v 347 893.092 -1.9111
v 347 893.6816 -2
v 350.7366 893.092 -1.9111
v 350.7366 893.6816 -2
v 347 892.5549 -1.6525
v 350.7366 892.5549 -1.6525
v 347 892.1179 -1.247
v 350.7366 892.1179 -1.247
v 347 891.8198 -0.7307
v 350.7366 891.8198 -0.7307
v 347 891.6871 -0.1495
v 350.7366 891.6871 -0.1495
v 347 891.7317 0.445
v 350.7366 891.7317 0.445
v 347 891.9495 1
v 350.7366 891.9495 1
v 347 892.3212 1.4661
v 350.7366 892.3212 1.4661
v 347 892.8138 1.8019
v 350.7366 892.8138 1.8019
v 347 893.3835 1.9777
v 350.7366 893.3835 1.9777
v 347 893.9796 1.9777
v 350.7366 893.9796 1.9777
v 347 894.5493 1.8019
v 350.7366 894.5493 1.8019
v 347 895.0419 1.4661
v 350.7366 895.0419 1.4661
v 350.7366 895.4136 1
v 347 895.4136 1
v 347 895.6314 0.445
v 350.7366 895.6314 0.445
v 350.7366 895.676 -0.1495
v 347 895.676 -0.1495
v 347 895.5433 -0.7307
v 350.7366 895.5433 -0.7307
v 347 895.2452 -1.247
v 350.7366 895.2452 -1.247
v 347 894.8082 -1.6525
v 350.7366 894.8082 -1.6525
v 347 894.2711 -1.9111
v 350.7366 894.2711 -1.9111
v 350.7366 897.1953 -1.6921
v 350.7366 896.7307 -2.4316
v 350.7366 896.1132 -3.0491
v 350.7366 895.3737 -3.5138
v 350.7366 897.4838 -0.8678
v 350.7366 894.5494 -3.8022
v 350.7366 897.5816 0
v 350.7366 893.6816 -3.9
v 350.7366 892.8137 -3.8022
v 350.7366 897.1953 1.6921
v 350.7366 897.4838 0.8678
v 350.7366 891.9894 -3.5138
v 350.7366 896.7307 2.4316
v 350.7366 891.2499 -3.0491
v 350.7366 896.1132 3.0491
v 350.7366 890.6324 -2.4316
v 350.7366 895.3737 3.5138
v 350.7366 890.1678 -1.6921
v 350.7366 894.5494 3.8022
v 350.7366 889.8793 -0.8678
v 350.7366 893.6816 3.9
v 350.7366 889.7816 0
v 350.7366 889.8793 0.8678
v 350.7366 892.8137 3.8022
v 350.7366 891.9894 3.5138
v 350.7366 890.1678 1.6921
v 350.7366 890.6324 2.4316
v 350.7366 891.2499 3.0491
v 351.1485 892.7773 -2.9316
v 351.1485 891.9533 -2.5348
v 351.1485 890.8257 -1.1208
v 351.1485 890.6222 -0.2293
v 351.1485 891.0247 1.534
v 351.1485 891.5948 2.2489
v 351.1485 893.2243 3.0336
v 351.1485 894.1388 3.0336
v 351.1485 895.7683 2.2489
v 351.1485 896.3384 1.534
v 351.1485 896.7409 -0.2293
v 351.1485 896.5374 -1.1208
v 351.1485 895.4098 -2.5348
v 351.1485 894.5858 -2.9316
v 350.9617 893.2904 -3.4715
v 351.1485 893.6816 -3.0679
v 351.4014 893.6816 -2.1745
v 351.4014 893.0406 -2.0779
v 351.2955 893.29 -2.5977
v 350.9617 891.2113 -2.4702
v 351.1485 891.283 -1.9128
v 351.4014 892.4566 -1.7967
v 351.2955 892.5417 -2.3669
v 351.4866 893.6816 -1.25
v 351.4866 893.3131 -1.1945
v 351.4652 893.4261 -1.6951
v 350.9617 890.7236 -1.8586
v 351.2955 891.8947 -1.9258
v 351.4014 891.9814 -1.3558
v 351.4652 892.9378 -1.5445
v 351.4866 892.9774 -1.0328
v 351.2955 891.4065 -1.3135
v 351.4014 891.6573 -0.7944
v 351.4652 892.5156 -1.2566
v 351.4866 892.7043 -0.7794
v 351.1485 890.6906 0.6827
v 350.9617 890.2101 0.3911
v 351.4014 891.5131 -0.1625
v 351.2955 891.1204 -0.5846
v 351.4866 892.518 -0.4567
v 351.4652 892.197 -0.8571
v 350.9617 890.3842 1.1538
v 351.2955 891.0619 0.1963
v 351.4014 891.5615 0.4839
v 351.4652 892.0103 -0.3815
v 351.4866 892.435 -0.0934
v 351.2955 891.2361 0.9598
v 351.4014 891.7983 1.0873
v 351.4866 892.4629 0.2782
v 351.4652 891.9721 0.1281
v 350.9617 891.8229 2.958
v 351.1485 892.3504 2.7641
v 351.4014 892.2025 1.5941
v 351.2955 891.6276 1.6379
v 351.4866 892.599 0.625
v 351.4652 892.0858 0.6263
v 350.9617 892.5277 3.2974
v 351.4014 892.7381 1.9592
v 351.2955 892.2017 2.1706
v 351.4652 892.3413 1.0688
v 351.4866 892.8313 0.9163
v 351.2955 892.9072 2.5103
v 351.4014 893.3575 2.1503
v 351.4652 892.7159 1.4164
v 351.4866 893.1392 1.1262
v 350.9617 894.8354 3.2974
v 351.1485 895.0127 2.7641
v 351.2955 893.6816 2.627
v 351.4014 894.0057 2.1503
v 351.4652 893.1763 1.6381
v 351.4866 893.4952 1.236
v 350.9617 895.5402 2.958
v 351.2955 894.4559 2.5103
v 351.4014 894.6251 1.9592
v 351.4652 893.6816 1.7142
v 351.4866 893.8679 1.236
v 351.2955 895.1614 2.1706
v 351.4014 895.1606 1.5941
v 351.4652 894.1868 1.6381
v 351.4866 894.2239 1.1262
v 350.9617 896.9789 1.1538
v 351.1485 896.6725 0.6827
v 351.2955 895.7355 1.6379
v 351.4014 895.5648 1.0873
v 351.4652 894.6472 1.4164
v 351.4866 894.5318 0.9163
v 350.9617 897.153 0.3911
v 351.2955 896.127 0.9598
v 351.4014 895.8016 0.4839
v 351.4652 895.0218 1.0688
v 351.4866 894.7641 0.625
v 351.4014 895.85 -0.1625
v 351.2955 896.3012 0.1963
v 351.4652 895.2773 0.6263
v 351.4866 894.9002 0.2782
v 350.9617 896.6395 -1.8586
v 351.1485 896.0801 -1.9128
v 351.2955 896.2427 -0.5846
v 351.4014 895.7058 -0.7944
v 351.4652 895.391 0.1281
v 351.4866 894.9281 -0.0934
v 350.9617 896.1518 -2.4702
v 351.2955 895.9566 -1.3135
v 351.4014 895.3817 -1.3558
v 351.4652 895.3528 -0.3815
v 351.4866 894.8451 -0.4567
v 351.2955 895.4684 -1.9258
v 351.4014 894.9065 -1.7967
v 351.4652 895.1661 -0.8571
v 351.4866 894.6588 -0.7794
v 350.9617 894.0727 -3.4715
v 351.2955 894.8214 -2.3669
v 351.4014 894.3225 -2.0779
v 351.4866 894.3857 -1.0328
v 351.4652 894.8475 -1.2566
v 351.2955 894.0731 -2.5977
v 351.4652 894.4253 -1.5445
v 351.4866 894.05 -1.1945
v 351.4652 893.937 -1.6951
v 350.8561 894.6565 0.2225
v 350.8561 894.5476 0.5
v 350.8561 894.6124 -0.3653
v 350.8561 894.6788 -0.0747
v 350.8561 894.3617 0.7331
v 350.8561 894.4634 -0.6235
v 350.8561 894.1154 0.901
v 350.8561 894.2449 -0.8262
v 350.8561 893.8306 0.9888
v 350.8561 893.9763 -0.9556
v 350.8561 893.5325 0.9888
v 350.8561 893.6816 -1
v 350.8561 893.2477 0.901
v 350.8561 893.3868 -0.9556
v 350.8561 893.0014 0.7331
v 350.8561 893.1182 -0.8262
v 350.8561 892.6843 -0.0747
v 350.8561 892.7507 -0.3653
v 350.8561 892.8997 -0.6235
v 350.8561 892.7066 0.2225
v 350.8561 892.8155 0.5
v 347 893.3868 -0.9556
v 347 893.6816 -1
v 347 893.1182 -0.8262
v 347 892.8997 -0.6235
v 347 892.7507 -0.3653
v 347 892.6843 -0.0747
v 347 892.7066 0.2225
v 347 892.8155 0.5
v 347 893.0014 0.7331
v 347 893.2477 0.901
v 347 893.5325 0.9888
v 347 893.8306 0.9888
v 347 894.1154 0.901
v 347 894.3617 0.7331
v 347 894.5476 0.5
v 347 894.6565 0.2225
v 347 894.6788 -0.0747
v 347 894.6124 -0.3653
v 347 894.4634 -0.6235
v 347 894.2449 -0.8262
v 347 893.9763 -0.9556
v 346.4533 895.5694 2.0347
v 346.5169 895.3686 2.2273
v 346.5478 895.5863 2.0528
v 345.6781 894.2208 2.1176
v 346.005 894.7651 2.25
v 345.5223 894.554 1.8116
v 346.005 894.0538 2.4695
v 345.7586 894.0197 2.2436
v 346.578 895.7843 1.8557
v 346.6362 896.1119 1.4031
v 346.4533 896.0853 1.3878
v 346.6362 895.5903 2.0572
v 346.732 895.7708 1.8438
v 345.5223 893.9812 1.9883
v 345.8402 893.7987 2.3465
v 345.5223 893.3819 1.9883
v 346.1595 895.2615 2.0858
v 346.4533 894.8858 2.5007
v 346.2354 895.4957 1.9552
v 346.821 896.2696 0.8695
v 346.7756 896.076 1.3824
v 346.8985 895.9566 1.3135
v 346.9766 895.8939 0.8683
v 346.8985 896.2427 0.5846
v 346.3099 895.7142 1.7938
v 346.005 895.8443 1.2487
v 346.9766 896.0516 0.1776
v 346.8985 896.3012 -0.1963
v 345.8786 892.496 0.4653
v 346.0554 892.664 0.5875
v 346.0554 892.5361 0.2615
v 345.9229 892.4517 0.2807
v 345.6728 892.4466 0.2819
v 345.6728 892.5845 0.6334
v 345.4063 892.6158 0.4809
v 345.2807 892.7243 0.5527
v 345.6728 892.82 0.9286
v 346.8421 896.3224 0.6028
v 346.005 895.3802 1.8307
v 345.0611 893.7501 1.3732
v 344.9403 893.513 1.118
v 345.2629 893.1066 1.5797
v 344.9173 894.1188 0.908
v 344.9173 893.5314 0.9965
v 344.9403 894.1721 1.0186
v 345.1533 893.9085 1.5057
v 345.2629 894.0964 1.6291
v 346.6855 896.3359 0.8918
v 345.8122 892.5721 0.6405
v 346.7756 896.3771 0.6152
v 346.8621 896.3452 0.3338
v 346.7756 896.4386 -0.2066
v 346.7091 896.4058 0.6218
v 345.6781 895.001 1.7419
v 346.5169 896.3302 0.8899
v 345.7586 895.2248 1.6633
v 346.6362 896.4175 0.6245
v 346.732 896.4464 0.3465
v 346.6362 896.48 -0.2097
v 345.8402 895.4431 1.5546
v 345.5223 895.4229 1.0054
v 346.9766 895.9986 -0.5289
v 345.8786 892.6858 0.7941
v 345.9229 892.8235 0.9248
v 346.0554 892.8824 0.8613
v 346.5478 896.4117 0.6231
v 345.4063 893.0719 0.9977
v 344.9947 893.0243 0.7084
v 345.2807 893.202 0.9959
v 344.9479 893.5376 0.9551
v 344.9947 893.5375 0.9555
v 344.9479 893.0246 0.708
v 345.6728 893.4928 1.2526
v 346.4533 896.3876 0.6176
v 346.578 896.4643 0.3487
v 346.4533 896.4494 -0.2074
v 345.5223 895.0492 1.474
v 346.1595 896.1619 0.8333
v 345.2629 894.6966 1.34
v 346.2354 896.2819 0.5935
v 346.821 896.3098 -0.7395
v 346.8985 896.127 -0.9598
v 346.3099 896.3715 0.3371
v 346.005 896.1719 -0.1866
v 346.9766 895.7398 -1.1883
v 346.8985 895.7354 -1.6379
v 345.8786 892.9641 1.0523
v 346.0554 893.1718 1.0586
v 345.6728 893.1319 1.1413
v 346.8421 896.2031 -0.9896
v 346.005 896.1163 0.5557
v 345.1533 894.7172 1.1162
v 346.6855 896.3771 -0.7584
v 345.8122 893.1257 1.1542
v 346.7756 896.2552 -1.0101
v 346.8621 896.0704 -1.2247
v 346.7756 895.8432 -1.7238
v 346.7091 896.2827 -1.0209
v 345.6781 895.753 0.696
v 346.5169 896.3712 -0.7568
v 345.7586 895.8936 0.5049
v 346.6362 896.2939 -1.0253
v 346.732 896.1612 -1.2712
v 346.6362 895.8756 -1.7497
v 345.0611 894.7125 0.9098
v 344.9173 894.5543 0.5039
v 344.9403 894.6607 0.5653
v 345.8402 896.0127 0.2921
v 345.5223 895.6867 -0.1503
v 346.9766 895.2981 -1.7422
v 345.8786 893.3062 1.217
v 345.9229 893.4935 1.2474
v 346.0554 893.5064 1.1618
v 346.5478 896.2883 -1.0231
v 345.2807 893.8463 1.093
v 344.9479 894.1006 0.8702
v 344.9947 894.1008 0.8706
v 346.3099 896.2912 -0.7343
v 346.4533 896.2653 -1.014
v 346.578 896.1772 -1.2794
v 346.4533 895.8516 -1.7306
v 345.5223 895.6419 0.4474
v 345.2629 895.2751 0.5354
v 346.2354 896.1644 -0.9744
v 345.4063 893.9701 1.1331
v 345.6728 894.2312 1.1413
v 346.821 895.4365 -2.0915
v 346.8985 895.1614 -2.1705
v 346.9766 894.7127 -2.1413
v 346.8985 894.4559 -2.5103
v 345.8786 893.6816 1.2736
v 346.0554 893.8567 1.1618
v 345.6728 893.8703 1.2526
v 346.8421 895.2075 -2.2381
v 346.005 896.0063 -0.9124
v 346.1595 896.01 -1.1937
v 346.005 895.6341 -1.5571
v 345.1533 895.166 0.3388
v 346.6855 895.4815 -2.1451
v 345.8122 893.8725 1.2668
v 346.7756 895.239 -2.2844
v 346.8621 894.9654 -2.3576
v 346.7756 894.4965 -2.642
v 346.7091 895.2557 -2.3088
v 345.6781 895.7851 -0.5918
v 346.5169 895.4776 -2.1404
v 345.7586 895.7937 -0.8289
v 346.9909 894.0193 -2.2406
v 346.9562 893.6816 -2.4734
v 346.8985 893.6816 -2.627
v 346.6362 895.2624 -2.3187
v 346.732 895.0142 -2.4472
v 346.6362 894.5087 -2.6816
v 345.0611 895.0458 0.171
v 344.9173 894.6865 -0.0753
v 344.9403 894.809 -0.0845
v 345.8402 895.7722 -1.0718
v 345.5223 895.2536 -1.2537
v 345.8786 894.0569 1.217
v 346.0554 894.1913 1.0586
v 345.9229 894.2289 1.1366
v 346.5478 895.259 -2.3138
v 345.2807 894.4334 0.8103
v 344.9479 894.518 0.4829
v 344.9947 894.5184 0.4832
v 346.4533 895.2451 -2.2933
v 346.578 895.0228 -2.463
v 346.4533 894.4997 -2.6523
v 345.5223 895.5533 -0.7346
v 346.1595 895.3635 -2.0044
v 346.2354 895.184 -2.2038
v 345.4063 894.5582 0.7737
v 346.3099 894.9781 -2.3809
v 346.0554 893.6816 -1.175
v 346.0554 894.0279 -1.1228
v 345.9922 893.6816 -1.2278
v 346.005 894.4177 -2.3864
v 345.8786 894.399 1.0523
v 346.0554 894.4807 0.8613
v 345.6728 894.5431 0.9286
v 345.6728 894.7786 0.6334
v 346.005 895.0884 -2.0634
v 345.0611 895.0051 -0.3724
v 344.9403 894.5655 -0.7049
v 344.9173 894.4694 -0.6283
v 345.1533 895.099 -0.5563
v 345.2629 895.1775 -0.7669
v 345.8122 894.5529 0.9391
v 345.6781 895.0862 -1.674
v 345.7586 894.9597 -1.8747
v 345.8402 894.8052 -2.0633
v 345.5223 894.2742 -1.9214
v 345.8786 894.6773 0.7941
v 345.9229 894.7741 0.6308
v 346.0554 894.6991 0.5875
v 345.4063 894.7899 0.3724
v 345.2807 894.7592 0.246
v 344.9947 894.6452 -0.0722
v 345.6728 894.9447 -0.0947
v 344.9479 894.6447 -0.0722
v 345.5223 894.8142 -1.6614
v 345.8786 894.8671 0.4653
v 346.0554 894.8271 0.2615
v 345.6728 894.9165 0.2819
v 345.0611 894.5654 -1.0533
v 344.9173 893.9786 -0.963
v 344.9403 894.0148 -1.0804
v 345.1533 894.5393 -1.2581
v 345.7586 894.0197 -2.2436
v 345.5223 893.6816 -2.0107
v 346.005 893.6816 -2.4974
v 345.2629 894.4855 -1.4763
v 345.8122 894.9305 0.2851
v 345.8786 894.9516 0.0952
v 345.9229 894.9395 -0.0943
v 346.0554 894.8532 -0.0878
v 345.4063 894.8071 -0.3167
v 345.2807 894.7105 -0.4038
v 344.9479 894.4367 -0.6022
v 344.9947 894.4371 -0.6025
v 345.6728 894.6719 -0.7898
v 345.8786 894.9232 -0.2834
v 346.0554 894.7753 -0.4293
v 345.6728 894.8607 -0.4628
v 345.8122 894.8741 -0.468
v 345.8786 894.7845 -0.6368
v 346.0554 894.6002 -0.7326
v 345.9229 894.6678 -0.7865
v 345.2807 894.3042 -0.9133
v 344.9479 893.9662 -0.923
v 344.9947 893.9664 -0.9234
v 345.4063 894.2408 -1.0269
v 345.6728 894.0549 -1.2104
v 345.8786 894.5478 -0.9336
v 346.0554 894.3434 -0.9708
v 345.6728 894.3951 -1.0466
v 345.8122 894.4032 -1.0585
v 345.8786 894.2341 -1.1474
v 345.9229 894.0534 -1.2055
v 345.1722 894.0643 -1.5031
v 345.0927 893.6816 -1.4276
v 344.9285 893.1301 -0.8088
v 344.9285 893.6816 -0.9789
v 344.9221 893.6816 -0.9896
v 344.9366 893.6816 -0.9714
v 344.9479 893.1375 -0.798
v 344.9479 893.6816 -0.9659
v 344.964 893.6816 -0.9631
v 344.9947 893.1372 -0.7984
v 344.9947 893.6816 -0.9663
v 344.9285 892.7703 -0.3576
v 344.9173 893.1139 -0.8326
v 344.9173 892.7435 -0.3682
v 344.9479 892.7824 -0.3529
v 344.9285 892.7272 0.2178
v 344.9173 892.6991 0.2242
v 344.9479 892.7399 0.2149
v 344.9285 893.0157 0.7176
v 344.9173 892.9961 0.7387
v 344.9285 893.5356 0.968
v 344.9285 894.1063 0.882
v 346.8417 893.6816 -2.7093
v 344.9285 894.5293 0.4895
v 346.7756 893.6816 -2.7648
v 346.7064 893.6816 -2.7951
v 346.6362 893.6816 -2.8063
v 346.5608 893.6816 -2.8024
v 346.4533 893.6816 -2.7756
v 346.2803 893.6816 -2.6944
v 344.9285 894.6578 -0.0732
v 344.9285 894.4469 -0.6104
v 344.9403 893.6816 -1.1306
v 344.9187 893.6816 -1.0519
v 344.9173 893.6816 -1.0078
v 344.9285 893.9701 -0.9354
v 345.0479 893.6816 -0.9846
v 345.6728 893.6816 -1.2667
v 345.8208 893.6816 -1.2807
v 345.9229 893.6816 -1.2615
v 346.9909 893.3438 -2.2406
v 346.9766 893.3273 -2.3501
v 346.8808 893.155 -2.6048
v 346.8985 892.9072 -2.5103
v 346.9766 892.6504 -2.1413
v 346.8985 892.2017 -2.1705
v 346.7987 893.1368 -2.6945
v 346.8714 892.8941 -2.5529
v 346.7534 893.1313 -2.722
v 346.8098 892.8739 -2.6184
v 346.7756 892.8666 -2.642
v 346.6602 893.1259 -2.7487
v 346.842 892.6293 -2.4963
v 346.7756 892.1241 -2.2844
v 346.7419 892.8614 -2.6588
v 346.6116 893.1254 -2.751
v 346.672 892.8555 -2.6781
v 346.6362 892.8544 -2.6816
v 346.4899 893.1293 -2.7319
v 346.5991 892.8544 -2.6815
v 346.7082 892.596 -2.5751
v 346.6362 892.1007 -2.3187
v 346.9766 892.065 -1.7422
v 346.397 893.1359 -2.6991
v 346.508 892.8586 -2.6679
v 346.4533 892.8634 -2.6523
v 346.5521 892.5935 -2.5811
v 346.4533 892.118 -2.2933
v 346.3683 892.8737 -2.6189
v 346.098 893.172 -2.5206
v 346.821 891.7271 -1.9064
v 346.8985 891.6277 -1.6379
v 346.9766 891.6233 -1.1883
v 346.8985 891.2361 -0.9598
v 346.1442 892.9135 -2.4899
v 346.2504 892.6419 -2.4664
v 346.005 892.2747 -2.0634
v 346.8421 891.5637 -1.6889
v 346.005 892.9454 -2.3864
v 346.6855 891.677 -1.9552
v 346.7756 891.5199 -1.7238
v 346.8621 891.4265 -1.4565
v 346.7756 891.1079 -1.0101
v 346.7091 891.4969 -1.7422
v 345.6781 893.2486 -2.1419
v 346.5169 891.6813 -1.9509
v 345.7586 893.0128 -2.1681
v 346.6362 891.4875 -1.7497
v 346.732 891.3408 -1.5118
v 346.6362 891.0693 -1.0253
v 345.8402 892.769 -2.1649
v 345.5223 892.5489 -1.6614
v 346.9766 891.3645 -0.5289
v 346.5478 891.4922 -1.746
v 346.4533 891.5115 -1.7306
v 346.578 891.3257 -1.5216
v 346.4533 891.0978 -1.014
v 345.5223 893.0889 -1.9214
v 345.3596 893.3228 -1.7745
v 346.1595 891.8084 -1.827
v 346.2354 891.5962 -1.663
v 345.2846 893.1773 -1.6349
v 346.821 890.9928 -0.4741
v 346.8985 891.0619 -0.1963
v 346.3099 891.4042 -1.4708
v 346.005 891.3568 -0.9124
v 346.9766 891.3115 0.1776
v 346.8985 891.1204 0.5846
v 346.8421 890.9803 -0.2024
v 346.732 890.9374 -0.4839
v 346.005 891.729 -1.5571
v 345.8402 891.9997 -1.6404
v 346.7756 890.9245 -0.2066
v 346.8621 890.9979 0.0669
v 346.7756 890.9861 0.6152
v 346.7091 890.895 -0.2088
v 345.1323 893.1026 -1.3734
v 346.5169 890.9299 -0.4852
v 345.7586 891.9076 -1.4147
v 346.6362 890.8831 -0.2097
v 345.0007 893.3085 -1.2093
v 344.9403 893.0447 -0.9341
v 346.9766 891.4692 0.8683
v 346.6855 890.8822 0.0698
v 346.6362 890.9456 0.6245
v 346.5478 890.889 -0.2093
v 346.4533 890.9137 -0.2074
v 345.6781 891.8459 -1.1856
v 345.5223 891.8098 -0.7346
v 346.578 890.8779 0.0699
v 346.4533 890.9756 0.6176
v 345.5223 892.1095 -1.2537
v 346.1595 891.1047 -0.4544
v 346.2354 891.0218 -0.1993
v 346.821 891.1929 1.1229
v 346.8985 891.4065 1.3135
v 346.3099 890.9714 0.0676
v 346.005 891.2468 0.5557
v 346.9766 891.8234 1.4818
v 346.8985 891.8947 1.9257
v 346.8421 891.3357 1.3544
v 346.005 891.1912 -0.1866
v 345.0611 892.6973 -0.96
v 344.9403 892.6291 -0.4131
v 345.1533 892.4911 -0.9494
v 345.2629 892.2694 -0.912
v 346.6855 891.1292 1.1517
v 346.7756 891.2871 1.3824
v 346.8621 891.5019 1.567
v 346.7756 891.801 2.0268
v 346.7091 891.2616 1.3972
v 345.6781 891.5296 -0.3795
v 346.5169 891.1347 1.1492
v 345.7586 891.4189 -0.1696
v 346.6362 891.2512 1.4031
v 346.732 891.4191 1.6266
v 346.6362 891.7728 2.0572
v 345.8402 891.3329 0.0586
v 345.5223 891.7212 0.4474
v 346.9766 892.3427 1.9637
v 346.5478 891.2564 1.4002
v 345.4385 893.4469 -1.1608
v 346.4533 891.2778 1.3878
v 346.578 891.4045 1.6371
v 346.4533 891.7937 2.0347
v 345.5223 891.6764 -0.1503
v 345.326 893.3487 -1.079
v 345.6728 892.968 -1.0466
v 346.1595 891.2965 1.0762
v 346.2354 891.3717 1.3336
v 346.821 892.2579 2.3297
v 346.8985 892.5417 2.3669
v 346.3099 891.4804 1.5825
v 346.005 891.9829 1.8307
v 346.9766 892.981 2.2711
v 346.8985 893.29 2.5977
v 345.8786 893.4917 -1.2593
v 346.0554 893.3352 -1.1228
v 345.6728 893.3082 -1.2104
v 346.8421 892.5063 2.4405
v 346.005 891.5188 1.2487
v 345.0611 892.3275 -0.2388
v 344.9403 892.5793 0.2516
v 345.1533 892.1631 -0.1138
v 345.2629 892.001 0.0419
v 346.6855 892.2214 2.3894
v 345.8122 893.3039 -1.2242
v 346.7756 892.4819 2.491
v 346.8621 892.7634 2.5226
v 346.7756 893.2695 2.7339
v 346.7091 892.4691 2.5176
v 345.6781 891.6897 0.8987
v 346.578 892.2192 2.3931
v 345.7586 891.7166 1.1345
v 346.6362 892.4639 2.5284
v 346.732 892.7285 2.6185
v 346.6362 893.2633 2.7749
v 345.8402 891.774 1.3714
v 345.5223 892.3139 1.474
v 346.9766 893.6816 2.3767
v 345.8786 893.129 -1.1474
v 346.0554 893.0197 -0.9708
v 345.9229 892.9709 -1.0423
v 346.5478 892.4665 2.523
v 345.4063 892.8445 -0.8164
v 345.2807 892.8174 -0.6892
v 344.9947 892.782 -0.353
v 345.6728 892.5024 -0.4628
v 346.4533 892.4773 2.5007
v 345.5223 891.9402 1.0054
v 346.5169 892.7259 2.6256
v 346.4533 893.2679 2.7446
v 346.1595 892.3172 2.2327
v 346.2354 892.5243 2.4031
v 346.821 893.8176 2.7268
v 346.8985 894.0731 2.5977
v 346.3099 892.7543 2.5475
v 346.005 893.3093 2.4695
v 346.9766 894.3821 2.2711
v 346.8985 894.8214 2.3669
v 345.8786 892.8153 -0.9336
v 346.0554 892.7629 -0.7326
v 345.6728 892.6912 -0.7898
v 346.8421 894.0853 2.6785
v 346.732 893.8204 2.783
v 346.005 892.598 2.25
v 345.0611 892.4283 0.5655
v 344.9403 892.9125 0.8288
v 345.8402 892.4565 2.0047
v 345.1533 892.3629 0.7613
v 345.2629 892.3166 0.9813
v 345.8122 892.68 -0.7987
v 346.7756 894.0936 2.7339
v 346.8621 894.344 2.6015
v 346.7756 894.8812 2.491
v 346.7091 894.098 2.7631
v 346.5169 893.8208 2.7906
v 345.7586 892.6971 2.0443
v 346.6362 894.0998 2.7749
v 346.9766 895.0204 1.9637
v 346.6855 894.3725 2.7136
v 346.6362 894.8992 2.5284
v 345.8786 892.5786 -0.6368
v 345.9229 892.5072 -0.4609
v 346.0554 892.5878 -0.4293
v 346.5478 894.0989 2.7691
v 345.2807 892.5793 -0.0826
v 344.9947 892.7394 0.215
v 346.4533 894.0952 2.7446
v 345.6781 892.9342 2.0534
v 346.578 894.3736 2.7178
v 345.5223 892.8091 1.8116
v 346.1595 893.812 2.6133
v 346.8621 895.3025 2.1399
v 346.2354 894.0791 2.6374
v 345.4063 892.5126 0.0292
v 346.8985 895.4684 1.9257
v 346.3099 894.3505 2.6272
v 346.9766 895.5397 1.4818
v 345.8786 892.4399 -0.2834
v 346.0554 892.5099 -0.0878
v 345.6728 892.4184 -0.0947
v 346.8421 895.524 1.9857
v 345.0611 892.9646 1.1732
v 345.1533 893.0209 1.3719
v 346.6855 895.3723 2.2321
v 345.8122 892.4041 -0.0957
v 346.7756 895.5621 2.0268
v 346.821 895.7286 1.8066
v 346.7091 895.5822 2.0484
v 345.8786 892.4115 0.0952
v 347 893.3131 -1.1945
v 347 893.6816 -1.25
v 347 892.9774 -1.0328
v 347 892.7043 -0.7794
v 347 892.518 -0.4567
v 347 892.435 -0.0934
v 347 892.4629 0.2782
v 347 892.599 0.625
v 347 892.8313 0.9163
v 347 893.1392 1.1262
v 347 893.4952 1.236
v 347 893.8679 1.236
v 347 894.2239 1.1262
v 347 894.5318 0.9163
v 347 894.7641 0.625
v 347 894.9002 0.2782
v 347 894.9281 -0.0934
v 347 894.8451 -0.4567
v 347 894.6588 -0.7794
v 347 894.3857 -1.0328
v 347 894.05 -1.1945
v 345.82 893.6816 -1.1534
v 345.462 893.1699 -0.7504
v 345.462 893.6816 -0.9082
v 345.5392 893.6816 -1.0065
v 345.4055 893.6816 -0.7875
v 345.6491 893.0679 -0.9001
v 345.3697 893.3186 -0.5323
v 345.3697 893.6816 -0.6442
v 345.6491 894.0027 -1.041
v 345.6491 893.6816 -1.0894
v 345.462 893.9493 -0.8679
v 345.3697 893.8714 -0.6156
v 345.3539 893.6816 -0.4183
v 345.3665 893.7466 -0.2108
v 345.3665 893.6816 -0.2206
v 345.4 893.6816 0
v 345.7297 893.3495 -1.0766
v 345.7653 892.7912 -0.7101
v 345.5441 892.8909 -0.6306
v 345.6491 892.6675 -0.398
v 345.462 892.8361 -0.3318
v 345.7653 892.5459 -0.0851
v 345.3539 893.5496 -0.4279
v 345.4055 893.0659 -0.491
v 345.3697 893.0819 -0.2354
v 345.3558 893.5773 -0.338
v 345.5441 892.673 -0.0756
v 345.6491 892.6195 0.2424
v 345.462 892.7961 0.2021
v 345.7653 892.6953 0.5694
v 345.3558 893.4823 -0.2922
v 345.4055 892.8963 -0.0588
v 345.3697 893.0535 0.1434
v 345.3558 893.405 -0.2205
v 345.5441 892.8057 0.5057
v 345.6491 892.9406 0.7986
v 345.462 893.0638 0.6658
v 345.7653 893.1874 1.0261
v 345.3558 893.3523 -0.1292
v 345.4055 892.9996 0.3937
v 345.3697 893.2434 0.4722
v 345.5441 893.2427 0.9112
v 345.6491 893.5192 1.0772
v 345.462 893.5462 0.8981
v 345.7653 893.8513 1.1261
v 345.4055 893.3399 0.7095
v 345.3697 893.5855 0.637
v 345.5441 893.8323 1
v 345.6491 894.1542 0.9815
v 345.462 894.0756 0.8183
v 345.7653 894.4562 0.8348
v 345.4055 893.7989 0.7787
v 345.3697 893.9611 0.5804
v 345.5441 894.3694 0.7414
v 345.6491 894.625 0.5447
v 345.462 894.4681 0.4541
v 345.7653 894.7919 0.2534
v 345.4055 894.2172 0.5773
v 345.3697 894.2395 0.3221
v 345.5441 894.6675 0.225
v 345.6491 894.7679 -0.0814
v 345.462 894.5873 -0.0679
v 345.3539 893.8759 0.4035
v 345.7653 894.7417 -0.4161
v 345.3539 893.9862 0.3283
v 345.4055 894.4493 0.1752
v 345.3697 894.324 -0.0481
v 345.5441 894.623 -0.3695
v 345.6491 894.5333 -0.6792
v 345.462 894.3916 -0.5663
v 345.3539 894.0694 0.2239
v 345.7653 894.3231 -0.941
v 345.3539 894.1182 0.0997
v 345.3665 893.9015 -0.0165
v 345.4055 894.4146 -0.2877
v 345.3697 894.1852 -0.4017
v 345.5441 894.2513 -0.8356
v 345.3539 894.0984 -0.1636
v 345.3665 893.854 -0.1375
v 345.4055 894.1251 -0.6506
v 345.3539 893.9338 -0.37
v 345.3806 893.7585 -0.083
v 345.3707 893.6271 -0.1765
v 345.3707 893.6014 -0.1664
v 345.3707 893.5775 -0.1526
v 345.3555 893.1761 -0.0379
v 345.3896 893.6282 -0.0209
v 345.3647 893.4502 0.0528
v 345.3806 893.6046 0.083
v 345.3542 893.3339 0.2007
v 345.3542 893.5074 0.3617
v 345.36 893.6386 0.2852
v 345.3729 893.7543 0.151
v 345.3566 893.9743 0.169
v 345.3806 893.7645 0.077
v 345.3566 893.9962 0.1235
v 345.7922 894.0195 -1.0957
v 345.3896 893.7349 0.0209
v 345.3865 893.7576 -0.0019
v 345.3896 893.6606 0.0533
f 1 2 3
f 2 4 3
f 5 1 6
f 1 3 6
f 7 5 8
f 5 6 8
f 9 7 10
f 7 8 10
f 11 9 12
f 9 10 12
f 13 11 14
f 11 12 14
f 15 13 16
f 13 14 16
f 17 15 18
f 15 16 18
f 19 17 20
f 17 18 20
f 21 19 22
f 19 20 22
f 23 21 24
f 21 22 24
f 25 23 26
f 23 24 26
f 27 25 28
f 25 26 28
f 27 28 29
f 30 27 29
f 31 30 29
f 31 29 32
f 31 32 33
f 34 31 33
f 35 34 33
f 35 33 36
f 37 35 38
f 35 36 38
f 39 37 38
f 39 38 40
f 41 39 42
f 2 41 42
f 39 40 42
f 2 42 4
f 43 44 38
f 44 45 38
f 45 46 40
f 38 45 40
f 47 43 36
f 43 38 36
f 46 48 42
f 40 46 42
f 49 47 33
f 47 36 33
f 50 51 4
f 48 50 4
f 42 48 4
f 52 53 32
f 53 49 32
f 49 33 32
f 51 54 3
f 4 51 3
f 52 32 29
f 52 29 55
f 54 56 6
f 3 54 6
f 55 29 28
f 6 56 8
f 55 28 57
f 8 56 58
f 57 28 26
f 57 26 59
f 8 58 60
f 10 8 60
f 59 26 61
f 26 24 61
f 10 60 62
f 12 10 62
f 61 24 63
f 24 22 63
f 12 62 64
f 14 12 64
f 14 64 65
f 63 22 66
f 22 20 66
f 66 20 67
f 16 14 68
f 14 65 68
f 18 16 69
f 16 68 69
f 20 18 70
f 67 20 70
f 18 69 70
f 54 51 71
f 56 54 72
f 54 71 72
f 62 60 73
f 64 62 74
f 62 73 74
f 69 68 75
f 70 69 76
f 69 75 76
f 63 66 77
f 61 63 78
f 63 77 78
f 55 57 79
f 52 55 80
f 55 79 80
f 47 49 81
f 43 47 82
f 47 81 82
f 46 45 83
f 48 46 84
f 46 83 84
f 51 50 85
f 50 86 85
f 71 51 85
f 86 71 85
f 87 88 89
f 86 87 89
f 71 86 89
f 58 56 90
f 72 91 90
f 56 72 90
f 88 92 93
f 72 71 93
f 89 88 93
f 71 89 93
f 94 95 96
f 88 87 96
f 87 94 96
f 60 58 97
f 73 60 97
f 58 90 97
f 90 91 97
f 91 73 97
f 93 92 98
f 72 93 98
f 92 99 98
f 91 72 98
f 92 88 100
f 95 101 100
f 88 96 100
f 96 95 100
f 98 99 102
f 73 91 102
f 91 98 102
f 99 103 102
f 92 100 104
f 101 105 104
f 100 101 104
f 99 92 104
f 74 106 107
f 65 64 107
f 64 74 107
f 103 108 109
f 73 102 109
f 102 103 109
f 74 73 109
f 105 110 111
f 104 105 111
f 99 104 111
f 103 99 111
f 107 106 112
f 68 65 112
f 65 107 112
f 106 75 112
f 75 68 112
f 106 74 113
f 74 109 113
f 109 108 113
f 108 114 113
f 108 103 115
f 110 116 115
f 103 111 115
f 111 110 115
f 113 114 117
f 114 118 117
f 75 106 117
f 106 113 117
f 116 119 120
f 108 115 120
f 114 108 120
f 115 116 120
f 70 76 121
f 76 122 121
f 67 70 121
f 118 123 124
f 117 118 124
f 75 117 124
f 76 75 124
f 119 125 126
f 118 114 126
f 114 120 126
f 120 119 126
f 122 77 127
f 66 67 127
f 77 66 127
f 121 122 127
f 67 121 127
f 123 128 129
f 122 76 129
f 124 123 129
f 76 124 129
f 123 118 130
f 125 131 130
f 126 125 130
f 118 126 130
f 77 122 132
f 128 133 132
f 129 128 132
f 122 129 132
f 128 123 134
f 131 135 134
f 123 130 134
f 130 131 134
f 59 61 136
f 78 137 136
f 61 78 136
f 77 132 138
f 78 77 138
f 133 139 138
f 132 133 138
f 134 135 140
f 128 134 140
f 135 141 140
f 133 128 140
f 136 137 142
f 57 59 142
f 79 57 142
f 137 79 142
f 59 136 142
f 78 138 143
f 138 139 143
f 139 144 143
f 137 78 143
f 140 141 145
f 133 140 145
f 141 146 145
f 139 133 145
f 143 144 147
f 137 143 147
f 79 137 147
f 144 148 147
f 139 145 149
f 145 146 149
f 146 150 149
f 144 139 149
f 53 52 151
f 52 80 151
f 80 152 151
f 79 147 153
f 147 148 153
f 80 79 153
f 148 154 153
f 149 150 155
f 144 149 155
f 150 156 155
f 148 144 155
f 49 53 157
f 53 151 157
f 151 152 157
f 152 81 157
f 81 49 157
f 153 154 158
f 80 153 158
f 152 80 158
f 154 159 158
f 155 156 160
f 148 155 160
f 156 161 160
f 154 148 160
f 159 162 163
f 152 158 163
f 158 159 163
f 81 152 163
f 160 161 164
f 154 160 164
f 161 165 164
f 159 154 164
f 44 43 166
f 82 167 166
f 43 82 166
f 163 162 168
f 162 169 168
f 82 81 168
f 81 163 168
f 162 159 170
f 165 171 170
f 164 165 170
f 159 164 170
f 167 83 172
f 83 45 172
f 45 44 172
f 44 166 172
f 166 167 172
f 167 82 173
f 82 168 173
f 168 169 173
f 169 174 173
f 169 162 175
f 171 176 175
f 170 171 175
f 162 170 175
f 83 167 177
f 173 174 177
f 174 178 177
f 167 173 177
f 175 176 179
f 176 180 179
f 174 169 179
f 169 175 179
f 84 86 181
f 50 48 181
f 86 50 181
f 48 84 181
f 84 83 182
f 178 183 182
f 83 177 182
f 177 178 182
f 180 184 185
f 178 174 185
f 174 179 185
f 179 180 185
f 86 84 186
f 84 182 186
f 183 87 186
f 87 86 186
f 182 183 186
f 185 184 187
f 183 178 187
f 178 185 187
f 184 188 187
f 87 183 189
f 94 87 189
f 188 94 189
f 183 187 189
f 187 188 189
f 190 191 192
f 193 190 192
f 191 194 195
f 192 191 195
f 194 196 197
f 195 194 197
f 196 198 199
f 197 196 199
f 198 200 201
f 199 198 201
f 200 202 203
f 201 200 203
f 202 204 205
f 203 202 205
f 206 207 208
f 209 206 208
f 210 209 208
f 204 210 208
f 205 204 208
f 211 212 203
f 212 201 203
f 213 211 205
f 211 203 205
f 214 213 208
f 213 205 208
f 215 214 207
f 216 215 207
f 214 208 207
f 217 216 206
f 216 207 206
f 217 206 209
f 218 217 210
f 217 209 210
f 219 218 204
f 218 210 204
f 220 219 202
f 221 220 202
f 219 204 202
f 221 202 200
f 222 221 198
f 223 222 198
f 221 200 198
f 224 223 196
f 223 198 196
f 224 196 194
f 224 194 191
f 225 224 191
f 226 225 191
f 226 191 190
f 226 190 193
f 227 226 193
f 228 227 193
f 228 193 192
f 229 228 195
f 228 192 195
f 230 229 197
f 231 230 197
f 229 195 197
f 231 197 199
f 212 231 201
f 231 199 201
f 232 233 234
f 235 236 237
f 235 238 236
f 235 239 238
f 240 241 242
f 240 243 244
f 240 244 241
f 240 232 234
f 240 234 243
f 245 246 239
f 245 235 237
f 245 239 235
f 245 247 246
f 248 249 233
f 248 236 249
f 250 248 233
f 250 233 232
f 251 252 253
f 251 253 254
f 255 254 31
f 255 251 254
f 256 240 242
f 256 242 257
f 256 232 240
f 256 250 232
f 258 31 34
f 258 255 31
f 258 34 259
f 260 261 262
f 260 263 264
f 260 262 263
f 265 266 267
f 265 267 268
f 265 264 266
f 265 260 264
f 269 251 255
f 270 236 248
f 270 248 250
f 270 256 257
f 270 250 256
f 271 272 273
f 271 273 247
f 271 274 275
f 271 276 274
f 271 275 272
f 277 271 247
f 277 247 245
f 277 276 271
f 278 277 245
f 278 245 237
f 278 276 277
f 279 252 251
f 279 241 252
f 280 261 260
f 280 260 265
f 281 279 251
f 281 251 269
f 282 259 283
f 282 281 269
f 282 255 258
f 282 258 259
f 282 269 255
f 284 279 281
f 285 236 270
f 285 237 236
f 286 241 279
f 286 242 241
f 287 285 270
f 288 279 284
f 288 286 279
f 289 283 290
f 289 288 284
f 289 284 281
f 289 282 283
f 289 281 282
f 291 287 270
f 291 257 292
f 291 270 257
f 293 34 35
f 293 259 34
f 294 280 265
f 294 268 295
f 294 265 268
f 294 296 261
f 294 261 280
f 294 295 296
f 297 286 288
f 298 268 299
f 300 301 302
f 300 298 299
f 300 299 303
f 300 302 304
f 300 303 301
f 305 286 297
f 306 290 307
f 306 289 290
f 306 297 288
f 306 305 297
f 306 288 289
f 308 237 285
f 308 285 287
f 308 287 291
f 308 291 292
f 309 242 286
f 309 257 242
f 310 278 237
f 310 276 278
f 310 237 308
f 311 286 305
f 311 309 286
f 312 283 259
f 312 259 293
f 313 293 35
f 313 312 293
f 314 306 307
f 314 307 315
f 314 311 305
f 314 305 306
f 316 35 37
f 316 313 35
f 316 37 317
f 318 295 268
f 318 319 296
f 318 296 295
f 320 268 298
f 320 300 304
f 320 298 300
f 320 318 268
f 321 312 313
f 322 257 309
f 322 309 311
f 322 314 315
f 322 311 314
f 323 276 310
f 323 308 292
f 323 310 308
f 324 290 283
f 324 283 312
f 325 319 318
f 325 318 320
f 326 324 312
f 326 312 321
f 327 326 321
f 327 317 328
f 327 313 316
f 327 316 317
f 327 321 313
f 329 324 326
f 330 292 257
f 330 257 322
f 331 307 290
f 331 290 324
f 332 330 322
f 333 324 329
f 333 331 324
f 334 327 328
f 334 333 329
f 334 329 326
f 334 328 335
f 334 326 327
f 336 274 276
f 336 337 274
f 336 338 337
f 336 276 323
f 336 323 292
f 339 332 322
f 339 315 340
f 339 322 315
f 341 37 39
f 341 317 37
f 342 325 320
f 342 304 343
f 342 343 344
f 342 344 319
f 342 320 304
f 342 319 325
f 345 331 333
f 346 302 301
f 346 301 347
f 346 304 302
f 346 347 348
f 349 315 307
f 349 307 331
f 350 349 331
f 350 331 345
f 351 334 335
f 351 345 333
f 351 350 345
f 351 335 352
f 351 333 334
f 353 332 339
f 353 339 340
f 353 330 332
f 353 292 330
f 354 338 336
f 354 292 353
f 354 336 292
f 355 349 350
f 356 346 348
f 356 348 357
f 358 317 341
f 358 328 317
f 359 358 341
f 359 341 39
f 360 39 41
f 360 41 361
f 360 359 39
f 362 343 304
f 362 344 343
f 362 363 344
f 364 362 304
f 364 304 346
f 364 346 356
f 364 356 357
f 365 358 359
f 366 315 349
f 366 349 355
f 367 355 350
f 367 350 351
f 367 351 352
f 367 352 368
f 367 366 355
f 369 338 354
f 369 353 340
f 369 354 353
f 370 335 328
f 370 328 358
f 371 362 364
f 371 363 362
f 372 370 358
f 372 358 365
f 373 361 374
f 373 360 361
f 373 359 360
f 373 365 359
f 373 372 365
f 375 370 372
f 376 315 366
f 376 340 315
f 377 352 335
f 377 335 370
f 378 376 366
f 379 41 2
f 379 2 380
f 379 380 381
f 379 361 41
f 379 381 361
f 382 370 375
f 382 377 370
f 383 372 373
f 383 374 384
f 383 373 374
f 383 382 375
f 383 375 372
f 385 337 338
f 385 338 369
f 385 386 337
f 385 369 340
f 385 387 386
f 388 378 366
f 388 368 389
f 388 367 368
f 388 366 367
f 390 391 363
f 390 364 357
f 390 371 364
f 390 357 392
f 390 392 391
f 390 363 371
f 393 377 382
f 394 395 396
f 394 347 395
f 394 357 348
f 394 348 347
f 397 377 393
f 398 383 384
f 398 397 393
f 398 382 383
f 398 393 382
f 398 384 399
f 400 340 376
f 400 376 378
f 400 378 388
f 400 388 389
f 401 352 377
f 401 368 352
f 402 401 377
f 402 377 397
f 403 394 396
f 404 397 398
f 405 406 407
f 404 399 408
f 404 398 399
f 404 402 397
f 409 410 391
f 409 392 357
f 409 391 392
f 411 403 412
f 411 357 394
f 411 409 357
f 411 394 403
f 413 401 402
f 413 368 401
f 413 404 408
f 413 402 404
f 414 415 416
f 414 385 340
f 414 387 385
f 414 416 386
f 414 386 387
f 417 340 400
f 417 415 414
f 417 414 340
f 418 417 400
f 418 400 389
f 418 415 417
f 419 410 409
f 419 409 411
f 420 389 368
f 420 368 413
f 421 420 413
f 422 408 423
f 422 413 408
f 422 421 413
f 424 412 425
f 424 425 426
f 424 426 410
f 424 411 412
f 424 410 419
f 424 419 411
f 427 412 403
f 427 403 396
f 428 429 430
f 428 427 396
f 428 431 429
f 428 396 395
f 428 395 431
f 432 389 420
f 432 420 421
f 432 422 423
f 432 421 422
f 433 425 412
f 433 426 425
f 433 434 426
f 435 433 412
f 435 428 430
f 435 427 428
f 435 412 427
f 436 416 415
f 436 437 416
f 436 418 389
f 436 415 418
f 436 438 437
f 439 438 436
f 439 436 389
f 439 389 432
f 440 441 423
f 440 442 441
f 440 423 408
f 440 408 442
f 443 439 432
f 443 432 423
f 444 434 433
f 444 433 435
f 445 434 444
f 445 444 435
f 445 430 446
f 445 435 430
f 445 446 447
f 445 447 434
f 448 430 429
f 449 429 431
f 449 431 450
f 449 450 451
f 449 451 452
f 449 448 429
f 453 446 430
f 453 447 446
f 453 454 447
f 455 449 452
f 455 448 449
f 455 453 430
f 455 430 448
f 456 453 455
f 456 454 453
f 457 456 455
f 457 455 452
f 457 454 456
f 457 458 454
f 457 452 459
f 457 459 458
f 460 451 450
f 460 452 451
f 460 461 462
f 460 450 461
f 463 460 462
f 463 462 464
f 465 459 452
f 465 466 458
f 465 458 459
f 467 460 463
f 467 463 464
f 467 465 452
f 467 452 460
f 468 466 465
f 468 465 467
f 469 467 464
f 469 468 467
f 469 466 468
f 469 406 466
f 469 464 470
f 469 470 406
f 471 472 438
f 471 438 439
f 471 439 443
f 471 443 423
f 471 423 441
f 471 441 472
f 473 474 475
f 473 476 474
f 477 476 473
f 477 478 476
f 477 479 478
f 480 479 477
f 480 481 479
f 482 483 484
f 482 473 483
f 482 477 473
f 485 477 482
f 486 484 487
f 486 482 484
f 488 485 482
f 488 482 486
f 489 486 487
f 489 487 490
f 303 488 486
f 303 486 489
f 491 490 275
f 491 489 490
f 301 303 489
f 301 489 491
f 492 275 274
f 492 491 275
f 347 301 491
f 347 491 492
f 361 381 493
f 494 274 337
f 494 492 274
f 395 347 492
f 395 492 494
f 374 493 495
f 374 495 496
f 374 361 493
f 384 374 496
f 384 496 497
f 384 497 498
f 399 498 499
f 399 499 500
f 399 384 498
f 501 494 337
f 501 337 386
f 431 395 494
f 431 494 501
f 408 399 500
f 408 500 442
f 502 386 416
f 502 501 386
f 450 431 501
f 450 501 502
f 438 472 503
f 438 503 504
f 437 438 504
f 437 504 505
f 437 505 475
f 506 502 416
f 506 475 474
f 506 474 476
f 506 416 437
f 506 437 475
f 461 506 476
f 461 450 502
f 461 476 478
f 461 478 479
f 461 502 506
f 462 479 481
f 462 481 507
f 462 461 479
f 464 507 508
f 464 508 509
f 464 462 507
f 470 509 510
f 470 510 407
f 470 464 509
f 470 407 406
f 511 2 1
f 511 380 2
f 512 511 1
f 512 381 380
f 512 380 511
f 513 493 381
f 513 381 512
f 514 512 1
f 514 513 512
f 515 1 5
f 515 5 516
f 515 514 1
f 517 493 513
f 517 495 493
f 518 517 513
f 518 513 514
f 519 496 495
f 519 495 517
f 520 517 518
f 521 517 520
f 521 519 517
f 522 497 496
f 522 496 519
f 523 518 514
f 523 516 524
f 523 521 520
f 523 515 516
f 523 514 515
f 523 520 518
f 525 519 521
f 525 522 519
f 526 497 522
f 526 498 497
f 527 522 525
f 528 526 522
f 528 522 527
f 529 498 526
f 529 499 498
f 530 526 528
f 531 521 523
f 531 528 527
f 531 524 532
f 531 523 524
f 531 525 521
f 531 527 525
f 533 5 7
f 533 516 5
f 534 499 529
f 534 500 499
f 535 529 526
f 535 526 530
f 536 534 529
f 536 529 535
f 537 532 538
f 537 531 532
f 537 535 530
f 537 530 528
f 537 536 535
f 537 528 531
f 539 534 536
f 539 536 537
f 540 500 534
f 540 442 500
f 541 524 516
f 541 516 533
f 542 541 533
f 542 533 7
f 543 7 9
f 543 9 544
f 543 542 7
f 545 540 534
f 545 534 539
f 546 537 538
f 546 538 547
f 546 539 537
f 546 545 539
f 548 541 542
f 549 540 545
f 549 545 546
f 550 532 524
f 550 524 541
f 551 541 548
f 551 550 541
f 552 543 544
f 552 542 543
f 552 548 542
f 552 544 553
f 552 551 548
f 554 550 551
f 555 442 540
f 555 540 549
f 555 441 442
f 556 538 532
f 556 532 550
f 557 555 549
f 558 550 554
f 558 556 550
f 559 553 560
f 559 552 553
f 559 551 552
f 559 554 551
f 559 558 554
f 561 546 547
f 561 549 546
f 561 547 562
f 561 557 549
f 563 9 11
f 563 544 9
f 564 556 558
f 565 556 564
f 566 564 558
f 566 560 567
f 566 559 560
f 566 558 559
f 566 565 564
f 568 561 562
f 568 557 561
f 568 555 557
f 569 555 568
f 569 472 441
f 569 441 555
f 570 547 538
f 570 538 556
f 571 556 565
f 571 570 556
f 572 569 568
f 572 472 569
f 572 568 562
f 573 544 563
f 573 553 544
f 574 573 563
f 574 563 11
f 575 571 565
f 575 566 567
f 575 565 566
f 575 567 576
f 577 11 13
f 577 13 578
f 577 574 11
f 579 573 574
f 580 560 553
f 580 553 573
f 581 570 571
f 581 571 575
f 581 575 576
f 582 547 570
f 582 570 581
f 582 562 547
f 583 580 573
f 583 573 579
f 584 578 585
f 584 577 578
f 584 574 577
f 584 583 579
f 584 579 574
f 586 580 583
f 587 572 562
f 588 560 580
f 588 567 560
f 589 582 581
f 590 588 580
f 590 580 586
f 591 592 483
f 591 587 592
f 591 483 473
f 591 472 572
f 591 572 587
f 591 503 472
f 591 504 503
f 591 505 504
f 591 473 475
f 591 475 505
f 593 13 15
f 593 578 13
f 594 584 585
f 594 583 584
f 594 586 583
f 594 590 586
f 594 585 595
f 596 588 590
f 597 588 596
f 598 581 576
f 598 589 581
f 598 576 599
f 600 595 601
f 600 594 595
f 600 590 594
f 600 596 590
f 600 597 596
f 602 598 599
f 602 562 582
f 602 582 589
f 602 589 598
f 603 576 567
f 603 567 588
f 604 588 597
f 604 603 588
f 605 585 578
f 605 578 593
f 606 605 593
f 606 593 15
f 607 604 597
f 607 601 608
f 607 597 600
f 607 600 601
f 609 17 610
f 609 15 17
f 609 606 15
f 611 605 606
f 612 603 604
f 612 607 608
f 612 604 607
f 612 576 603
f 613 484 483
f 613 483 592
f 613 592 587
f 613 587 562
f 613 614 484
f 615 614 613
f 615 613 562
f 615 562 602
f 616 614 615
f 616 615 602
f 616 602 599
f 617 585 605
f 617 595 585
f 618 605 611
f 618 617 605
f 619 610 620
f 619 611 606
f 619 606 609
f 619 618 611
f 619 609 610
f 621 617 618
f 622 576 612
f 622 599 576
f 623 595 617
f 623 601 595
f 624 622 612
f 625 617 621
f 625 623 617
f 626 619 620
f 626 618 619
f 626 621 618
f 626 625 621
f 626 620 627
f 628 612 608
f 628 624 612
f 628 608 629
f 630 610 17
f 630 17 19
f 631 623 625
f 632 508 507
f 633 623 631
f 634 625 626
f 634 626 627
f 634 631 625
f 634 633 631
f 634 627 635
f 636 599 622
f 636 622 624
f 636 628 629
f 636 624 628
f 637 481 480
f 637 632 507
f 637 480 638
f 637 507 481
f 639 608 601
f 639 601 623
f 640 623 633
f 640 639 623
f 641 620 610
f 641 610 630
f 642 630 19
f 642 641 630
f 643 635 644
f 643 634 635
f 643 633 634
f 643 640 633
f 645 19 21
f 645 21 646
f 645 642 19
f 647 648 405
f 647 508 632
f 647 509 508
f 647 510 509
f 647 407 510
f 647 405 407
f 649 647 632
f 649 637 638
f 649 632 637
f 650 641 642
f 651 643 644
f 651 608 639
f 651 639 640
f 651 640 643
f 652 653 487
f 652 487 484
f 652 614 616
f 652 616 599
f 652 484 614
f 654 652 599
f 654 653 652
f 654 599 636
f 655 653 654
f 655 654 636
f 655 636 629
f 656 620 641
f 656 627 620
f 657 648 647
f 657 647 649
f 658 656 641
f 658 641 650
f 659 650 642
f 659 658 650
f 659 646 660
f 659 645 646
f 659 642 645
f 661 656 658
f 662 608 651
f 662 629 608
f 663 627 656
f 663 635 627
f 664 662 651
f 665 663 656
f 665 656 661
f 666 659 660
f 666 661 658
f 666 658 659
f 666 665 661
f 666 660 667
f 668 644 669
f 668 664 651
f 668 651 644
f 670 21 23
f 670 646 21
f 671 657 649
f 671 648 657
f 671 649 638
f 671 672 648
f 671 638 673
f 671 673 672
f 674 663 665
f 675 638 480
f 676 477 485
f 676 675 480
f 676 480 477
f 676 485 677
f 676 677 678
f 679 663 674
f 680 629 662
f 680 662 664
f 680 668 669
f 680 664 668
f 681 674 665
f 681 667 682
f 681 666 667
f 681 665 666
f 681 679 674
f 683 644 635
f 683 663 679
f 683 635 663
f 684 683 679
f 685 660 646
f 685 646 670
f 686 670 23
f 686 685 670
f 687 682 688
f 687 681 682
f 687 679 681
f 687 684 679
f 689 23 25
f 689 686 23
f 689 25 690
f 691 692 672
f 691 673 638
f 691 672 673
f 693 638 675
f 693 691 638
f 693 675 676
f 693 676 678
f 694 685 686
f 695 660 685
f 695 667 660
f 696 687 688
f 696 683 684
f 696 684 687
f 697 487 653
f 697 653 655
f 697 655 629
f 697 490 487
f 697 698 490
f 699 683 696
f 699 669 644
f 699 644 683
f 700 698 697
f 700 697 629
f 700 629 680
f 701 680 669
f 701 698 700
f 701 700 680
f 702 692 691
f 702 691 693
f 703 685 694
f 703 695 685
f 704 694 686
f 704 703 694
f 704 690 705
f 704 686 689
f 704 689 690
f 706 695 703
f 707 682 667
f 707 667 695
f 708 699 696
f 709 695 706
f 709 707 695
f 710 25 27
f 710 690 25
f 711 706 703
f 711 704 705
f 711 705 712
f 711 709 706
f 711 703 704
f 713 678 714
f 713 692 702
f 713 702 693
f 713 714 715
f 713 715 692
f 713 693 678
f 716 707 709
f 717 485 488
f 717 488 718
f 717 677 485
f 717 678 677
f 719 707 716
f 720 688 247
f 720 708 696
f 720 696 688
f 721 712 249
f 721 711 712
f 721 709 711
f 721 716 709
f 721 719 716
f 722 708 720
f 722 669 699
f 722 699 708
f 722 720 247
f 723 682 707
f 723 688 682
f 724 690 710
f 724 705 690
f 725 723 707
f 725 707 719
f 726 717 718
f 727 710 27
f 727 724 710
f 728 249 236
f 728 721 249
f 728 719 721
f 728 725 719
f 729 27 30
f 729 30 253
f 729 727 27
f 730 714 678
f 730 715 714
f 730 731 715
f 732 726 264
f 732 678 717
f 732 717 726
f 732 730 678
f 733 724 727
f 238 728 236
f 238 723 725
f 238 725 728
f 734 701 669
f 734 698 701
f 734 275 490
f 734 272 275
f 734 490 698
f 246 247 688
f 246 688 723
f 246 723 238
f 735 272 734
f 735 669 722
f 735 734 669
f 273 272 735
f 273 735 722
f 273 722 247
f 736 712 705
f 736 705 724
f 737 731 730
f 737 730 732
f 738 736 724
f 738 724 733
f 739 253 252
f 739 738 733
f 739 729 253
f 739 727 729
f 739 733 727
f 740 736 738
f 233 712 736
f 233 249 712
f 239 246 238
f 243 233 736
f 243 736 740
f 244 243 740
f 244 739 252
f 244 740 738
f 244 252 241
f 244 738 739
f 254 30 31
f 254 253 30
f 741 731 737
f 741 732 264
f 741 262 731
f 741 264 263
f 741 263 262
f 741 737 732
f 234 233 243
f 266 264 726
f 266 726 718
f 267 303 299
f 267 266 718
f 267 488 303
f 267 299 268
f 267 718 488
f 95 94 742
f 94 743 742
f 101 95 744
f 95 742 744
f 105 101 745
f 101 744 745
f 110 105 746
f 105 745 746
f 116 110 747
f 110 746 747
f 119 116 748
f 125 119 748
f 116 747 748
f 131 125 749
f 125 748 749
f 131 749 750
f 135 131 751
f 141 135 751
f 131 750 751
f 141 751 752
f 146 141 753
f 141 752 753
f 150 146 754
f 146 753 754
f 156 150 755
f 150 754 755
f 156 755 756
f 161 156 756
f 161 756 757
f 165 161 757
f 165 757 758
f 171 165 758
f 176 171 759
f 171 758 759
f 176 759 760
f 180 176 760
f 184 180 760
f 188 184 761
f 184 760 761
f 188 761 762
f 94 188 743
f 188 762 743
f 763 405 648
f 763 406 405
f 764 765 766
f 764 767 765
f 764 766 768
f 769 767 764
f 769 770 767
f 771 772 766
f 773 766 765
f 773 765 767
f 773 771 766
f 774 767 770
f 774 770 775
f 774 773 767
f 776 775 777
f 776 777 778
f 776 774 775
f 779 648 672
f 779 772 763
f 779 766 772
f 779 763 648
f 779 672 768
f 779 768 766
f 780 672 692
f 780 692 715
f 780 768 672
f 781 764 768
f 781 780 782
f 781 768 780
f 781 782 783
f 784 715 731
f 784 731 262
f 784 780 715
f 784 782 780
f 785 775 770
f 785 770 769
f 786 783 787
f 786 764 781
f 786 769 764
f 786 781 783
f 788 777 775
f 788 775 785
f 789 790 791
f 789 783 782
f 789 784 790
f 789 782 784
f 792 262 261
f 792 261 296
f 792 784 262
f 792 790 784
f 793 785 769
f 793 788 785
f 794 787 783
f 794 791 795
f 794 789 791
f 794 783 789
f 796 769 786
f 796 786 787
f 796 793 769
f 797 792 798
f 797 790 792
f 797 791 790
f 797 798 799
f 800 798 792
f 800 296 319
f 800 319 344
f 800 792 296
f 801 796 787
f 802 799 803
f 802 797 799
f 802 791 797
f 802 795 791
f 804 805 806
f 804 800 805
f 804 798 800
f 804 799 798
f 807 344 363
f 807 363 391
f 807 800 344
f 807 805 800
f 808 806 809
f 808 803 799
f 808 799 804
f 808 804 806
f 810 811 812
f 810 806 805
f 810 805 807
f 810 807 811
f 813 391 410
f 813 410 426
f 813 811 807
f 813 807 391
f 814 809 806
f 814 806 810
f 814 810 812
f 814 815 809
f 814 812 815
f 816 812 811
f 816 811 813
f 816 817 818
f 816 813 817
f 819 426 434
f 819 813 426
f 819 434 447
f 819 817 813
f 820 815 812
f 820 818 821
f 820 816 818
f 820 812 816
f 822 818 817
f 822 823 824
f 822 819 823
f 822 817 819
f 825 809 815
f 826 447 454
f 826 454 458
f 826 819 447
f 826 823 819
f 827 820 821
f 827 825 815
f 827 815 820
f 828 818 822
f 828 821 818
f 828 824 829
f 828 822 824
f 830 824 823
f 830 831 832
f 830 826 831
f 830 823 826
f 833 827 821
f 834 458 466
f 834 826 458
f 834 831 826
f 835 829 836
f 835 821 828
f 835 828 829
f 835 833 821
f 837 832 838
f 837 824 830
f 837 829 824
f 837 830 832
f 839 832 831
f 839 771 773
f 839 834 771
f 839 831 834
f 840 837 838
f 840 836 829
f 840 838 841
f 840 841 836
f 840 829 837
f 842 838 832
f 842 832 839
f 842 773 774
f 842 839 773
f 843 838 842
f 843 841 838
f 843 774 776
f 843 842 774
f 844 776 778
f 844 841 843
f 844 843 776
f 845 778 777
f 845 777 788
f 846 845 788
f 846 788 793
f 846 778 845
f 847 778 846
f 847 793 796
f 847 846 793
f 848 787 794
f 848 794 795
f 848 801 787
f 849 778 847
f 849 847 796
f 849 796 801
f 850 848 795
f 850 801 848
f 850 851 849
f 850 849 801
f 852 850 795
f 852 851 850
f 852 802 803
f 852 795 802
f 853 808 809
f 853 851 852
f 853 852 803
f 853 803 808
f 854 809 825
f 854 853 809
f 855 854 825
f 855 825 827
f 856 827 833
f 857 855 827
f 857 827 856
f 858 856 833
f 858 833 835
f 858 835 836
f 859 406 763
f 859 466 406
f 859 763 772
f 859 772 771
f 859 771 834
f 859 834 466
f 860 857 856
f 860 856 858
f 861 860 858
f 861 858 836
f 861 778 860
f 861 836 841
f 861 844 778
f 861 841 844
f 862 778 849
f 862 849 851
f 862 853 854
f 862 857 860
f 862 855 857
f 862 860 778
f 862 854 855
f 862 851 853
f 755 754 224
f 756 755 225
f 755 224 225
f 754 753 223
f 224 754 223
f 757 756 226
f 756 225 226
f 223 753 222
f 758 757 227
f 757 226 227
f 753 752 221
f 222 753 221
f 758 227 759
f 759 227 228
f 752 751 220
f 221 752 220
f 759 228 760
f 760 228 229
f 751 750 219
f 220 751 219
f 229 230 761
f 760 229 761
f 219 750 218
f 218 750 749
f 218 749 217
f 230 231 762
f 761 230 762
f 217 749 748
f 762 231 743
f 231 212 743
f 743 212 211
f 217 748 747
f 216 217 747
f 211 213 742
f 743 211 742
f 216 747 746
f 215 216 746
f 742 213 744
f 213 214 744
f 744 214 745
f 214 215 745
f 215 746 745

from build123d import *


with BuildPart() as part:
    # Szkic1 → Obrót1 (revolve)
    with BuildSketch(Plane.XY, mode=Mode.PRIVATE) as obr_t1_sk:
        with BuildLine():
            Line((350.856147885, 893.681551629), (345.4, 893.681551629))
            add(Edge.make_bspline(
                [(346.055380649, 894.856511413), (345.173909168, 894.872028365), (345.4, 893.681551629)],
                knots=[0, 0, 0, 1, 1, 1], degree=2))
            add(Edge.make_bspline(
                [(347.000000014, 895.681551629), (347.036555424, 898.021351685), (343.536594652, 893.309377005), (345.758684651, 895.170148194), (346.055380649, 894.856511413)],
                knots=[0, 0, 0, 0, 0.744501965, 1, 1, 1, 1], degree=3))
            Line((347.000000014, 895.681551629), (350.7366, 895.681551629))
            Line((350.7366, 895.681551629), (350.7366, 897.581551629))
            ThreePointArc((350.7366, 897.581551629), (351.295488572, 896.308595565), (351.4866, 894.931551629))
            Line((351.4866, 894.931551629), (347, 894.931551629))
            Line((347, 894.931551629), (347, 894.681551629))
            Line((347, 894.681551629), (350.856147885, 894.681551629))
            Line((350.856147885, 894.681551629), (350.856147885, 893.681551629))
        make_face()
    revolve(obr_t1_sk.sketch.rotate(Axis((350.856147885, 893.681551629, 0), (-1, 0, 0)), 90), axis=Axis((350.856147885, 893.681551629, 0), (-1, 0, 0)))


solid = part.part
